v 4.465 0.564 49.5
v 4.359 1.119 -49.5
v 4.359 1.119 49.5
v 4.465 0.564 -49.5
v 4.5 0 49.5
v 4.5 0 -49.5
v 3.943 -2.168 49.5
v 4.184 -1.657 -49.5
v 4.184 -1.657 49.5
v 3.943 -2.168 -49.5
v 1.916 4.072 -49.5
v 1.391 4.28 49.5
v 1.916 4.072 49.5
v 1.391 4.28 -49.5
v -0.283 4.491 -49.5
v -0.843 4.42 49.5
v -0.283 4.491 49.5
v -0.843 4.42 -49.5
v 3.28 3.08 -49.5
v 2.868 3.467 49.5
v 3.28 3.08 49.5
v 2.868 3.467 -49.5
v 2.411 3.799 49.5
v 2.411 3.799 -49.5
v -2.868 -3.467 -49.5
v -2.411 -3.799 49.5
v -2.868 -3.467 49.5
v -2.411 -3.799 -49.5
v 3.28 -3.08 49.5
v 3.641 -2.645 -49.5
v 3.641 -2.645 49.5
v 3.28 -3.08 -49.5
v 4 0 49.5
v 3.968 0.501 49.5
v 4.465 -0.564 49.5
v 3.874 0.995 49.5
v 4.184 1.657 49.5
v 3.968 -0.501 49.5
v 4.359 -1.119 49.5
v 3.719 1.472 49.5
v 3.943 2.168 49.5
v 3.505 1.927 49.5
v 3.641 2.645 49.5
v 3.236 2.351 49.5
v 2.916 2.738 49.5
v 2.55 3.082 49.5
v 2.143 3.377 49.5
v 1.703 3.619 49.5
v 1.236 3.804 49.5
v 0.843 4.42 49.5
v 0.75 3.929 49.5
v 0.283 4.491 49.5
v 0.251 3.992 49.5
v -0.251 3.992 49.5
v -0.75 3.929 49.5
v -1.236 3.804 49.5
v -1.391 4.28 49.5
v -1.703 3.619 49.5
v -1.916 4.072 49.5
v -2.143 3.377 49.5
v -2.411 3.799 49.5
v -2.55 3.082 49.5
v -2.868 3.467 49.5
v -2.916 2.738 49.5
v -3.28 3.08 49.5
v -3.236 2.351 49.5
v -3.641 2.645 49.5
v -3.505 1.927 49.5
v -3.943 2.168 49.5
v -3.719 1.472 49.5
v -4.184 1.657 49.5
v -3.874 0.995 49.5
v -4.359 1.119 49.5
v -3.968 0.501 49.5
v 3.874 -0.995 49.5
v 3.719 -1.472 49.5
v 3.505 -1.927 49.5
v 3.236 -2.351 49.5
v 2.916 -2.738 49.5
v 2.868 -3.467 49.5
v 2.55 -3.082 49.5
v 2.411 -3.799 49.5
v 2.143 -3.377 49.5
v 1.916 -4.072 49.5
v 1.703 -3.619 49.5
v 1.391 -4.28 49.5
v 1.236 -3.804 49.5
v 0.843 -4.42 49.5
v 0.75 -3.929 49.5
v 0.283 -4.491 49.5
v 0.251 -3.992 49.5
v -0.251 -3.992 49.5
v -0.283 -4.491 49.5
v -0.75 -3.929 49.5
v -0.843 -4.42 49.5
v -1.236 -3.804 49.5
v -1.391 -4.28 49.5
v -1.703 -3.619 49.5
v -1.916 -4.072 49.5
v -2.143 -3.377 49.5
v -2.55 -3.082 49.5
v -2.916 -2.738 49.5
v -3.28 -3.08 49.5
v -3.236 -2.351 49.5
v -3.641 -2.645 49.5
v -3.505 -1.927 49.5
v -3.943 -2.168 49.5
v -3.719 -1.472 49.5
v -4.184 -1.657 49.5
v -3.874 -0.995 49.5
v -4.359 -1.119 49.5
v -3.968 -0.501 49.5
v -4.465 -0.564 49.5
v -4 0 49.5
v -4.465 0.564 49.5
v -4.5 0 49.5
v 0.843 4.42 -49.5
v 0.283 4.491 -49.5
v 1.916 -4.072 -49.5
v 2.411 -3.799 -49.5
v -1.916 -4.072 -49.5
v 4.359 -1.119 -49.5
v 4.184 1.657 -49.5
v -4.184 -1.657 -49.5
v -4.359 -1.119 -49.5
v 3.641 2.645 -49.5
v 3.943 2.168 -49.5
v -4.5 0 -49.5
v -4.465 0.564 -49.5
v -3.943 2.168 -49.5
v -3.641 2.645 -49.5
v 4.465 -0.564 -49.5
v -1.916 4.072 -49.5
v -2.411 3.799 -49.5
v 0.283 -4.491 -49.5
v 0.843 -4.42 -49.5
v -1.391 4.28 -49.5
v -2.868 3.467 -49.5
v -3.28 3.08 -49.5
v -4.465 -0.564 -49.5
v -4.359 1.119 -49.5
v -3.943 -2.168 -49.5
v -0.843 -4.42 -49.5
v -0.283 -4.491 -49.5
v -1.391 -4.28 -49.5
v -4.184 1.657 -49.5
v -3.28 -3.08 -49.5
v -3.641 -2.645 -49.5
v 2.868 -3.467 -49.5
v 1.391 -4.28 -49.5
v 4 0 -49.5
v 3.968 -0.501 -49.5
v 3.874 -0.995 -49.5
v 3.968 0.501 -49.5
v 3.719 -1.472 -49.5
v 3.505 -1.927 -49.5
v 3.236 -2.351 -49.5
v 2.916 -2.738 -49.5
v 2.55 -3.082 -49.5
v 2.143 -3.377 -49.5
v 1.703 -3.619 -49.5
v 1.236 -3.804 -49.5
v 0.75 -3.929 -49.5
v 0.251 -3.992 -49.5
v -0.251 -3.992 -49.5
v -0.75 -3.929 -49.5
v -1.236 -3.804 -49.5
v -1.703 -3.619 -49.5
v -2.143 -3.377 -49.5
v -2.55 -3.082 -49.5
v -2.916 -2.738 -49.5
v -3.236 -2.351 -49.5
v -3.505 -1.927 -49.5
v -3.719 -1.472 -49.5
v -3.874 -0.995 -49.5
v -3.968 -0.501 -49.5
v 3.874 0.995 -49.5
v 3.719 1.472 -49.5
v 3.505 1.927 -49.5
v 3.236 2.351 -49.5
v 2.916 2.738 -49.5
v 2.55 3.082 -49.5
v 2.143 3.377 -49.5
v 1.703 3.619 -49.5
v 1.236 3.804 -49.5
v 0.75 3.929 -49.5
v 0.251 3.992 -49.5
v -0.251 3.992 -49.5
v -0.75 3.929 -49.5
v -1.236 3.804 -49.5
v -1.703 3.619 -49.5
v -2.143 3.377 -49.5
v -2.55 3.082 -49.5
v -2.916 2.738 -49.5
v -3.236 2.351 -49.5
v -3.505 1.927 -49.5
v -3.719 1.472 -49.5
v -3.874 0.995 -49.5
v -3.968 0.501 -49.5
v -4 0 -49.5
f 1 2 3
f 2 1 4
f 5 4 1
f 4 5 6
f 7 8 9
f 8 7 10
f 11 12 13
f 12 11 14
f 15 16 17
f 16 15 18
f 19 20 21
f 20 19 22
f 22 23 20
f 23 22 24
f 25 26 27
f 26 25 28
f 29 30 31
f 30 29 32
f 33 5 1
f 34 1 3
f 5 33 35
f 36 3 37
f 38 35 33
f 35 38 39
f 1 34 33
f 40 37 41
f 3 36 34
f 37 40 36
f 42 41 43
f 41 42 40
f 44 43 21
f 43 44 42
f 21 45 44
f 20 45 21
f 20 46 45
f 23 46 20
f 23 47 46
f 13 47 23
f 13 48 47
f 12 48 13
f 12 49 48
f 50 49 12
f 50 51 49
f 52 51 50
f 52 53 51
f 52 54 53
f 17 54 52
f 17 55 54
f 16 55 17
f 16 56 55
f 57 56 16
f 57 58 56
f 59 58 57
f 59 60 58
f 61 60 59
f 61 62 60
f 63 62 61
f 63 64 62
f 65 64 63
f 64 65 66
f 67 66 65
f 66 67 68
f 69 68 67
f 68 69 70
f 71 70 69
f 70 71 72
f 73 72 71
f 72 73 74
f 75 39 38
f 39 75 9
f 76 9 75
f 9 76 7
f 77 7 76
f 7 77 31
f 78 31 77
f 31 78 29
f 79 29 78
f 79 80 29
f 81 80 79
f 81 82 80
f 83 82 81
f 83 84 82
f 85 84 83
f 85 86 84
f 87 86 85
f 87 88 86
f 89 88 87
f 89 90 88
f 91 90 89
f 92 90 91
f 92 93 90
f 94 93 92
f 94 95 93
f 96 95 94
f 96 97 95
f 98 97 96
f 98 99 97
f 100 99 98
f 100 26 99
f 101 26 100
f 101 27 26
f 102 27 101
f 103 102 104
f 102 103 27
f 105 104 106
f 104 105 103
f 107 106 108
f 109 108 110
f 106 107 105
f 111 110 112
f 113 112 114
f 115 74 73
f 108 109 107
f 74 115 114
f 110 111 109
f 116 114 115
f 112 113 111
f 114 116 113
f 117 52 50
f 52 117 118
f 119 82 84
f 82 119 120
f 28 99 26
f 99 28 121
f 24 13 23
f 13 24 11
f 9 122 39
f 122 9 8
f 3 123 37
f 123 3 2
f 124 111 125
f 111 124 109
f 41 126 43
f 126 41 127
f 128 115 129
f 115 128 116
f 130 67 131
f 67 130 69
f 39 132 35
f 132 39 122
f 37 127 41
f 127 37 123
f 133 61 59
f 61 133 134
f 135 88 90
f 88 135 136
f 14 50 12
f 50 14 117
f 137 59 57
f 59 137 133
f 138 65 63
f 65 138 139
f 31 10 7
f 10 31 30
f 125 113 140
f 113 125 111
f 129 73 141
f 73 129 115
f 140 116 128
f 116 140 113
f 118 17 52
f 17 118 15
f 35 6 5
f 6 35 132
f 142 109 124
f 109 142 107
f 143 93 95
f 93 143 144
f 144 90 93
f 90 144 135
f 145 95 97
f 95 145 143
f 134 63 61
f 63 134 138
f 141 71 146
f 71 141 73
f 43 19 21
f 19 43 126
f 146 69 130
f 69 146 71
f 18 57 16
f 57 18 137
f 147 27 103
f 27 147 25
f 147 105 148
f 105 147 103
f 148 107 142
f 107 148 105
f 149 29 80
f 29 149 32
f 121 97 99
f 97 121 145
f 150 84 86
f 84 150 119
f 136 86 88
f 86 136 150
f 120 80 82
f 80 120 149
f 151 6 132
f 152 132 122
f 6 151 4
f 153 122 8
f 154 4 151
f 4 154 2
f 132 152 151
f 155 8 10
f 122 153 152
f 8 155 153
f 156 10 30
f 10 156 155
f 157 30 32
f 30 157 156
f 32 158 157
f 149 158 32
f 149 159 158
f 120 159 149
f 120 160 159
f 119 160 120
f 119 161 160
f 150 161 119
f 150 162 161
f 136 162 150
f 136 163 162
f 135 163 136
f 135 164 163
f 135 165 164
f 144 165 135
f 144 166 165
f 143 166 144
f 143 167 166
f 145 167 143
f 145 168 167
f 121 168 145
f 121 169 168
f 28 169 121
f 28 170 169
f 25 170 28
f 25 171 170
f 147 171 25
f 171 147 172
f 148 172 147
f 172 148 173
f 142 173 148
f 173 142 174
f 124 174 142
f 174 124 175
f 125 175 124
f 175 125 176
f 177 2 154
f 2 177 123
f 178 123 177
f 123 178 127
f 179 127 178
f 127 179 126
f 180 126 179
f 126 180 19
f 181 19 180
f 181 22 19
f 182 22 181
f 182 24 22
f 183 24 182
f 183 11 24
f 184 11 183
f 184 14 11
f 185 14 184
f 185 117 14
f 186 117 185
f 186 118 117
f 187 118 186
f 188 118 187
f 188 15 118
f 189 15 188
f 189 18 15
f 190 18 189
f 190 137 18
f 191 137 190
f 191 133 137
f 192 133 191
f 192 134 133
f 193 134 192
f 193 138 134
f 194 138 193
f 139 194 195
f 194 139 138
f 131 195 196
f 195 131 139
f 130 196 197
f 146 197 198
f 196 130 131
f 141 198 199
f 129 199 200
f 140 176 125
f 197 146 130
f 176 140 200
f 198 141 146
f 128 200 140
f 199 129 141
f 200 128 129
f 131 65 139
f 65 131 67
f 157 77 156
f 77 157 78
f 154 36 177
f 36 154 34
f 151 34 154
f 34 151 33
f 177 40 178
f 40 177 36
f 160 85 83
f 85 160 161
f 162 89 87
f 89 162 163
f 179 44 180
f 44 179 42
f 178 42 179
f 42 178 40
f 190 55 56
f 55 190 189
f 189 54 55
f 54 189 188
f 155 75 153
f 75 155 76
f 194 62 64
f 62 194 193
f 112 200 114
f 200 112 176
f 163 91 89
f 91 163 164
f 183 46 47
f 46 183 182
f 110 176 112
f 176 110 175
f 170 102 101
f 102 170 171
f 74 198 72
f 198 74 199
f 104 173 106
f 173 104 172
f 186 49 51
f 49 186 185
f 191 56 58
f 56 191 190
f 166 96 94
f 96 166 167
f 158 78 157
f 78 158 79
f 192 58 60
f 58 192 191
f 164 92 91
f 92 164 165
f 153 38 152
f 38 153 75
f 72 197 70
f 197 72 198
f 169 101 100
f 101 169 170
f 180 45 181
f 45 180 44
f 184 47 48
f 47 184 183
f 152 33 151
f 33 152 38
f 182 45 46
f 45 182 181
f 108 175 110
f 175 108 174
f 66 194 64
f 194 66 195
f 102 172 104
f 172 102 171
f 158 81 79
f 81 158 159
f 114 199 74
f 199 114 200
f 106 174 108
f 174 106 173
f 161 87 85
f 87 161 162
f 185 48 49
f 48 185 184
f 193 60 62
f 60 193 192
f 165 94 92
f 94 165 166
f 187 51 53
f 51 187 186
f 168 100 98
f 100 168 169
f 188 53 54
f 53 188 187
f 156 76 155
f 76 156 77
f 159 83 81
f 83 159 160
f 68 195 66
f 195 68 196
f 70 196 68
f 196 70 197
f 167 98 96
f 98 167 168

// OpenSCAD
$fn = 50;


difference() {
	union() {
		translate(v = [0, 0, -49.5000000000]) {
			cylinder(h = 99, r = 4.5000000000);
		}
	}
	union() {
		translate(v = [0, 0, -100.0000000000]) {
			cylinder(h = 200, r = 4.0000000000);
		}
	}
}
